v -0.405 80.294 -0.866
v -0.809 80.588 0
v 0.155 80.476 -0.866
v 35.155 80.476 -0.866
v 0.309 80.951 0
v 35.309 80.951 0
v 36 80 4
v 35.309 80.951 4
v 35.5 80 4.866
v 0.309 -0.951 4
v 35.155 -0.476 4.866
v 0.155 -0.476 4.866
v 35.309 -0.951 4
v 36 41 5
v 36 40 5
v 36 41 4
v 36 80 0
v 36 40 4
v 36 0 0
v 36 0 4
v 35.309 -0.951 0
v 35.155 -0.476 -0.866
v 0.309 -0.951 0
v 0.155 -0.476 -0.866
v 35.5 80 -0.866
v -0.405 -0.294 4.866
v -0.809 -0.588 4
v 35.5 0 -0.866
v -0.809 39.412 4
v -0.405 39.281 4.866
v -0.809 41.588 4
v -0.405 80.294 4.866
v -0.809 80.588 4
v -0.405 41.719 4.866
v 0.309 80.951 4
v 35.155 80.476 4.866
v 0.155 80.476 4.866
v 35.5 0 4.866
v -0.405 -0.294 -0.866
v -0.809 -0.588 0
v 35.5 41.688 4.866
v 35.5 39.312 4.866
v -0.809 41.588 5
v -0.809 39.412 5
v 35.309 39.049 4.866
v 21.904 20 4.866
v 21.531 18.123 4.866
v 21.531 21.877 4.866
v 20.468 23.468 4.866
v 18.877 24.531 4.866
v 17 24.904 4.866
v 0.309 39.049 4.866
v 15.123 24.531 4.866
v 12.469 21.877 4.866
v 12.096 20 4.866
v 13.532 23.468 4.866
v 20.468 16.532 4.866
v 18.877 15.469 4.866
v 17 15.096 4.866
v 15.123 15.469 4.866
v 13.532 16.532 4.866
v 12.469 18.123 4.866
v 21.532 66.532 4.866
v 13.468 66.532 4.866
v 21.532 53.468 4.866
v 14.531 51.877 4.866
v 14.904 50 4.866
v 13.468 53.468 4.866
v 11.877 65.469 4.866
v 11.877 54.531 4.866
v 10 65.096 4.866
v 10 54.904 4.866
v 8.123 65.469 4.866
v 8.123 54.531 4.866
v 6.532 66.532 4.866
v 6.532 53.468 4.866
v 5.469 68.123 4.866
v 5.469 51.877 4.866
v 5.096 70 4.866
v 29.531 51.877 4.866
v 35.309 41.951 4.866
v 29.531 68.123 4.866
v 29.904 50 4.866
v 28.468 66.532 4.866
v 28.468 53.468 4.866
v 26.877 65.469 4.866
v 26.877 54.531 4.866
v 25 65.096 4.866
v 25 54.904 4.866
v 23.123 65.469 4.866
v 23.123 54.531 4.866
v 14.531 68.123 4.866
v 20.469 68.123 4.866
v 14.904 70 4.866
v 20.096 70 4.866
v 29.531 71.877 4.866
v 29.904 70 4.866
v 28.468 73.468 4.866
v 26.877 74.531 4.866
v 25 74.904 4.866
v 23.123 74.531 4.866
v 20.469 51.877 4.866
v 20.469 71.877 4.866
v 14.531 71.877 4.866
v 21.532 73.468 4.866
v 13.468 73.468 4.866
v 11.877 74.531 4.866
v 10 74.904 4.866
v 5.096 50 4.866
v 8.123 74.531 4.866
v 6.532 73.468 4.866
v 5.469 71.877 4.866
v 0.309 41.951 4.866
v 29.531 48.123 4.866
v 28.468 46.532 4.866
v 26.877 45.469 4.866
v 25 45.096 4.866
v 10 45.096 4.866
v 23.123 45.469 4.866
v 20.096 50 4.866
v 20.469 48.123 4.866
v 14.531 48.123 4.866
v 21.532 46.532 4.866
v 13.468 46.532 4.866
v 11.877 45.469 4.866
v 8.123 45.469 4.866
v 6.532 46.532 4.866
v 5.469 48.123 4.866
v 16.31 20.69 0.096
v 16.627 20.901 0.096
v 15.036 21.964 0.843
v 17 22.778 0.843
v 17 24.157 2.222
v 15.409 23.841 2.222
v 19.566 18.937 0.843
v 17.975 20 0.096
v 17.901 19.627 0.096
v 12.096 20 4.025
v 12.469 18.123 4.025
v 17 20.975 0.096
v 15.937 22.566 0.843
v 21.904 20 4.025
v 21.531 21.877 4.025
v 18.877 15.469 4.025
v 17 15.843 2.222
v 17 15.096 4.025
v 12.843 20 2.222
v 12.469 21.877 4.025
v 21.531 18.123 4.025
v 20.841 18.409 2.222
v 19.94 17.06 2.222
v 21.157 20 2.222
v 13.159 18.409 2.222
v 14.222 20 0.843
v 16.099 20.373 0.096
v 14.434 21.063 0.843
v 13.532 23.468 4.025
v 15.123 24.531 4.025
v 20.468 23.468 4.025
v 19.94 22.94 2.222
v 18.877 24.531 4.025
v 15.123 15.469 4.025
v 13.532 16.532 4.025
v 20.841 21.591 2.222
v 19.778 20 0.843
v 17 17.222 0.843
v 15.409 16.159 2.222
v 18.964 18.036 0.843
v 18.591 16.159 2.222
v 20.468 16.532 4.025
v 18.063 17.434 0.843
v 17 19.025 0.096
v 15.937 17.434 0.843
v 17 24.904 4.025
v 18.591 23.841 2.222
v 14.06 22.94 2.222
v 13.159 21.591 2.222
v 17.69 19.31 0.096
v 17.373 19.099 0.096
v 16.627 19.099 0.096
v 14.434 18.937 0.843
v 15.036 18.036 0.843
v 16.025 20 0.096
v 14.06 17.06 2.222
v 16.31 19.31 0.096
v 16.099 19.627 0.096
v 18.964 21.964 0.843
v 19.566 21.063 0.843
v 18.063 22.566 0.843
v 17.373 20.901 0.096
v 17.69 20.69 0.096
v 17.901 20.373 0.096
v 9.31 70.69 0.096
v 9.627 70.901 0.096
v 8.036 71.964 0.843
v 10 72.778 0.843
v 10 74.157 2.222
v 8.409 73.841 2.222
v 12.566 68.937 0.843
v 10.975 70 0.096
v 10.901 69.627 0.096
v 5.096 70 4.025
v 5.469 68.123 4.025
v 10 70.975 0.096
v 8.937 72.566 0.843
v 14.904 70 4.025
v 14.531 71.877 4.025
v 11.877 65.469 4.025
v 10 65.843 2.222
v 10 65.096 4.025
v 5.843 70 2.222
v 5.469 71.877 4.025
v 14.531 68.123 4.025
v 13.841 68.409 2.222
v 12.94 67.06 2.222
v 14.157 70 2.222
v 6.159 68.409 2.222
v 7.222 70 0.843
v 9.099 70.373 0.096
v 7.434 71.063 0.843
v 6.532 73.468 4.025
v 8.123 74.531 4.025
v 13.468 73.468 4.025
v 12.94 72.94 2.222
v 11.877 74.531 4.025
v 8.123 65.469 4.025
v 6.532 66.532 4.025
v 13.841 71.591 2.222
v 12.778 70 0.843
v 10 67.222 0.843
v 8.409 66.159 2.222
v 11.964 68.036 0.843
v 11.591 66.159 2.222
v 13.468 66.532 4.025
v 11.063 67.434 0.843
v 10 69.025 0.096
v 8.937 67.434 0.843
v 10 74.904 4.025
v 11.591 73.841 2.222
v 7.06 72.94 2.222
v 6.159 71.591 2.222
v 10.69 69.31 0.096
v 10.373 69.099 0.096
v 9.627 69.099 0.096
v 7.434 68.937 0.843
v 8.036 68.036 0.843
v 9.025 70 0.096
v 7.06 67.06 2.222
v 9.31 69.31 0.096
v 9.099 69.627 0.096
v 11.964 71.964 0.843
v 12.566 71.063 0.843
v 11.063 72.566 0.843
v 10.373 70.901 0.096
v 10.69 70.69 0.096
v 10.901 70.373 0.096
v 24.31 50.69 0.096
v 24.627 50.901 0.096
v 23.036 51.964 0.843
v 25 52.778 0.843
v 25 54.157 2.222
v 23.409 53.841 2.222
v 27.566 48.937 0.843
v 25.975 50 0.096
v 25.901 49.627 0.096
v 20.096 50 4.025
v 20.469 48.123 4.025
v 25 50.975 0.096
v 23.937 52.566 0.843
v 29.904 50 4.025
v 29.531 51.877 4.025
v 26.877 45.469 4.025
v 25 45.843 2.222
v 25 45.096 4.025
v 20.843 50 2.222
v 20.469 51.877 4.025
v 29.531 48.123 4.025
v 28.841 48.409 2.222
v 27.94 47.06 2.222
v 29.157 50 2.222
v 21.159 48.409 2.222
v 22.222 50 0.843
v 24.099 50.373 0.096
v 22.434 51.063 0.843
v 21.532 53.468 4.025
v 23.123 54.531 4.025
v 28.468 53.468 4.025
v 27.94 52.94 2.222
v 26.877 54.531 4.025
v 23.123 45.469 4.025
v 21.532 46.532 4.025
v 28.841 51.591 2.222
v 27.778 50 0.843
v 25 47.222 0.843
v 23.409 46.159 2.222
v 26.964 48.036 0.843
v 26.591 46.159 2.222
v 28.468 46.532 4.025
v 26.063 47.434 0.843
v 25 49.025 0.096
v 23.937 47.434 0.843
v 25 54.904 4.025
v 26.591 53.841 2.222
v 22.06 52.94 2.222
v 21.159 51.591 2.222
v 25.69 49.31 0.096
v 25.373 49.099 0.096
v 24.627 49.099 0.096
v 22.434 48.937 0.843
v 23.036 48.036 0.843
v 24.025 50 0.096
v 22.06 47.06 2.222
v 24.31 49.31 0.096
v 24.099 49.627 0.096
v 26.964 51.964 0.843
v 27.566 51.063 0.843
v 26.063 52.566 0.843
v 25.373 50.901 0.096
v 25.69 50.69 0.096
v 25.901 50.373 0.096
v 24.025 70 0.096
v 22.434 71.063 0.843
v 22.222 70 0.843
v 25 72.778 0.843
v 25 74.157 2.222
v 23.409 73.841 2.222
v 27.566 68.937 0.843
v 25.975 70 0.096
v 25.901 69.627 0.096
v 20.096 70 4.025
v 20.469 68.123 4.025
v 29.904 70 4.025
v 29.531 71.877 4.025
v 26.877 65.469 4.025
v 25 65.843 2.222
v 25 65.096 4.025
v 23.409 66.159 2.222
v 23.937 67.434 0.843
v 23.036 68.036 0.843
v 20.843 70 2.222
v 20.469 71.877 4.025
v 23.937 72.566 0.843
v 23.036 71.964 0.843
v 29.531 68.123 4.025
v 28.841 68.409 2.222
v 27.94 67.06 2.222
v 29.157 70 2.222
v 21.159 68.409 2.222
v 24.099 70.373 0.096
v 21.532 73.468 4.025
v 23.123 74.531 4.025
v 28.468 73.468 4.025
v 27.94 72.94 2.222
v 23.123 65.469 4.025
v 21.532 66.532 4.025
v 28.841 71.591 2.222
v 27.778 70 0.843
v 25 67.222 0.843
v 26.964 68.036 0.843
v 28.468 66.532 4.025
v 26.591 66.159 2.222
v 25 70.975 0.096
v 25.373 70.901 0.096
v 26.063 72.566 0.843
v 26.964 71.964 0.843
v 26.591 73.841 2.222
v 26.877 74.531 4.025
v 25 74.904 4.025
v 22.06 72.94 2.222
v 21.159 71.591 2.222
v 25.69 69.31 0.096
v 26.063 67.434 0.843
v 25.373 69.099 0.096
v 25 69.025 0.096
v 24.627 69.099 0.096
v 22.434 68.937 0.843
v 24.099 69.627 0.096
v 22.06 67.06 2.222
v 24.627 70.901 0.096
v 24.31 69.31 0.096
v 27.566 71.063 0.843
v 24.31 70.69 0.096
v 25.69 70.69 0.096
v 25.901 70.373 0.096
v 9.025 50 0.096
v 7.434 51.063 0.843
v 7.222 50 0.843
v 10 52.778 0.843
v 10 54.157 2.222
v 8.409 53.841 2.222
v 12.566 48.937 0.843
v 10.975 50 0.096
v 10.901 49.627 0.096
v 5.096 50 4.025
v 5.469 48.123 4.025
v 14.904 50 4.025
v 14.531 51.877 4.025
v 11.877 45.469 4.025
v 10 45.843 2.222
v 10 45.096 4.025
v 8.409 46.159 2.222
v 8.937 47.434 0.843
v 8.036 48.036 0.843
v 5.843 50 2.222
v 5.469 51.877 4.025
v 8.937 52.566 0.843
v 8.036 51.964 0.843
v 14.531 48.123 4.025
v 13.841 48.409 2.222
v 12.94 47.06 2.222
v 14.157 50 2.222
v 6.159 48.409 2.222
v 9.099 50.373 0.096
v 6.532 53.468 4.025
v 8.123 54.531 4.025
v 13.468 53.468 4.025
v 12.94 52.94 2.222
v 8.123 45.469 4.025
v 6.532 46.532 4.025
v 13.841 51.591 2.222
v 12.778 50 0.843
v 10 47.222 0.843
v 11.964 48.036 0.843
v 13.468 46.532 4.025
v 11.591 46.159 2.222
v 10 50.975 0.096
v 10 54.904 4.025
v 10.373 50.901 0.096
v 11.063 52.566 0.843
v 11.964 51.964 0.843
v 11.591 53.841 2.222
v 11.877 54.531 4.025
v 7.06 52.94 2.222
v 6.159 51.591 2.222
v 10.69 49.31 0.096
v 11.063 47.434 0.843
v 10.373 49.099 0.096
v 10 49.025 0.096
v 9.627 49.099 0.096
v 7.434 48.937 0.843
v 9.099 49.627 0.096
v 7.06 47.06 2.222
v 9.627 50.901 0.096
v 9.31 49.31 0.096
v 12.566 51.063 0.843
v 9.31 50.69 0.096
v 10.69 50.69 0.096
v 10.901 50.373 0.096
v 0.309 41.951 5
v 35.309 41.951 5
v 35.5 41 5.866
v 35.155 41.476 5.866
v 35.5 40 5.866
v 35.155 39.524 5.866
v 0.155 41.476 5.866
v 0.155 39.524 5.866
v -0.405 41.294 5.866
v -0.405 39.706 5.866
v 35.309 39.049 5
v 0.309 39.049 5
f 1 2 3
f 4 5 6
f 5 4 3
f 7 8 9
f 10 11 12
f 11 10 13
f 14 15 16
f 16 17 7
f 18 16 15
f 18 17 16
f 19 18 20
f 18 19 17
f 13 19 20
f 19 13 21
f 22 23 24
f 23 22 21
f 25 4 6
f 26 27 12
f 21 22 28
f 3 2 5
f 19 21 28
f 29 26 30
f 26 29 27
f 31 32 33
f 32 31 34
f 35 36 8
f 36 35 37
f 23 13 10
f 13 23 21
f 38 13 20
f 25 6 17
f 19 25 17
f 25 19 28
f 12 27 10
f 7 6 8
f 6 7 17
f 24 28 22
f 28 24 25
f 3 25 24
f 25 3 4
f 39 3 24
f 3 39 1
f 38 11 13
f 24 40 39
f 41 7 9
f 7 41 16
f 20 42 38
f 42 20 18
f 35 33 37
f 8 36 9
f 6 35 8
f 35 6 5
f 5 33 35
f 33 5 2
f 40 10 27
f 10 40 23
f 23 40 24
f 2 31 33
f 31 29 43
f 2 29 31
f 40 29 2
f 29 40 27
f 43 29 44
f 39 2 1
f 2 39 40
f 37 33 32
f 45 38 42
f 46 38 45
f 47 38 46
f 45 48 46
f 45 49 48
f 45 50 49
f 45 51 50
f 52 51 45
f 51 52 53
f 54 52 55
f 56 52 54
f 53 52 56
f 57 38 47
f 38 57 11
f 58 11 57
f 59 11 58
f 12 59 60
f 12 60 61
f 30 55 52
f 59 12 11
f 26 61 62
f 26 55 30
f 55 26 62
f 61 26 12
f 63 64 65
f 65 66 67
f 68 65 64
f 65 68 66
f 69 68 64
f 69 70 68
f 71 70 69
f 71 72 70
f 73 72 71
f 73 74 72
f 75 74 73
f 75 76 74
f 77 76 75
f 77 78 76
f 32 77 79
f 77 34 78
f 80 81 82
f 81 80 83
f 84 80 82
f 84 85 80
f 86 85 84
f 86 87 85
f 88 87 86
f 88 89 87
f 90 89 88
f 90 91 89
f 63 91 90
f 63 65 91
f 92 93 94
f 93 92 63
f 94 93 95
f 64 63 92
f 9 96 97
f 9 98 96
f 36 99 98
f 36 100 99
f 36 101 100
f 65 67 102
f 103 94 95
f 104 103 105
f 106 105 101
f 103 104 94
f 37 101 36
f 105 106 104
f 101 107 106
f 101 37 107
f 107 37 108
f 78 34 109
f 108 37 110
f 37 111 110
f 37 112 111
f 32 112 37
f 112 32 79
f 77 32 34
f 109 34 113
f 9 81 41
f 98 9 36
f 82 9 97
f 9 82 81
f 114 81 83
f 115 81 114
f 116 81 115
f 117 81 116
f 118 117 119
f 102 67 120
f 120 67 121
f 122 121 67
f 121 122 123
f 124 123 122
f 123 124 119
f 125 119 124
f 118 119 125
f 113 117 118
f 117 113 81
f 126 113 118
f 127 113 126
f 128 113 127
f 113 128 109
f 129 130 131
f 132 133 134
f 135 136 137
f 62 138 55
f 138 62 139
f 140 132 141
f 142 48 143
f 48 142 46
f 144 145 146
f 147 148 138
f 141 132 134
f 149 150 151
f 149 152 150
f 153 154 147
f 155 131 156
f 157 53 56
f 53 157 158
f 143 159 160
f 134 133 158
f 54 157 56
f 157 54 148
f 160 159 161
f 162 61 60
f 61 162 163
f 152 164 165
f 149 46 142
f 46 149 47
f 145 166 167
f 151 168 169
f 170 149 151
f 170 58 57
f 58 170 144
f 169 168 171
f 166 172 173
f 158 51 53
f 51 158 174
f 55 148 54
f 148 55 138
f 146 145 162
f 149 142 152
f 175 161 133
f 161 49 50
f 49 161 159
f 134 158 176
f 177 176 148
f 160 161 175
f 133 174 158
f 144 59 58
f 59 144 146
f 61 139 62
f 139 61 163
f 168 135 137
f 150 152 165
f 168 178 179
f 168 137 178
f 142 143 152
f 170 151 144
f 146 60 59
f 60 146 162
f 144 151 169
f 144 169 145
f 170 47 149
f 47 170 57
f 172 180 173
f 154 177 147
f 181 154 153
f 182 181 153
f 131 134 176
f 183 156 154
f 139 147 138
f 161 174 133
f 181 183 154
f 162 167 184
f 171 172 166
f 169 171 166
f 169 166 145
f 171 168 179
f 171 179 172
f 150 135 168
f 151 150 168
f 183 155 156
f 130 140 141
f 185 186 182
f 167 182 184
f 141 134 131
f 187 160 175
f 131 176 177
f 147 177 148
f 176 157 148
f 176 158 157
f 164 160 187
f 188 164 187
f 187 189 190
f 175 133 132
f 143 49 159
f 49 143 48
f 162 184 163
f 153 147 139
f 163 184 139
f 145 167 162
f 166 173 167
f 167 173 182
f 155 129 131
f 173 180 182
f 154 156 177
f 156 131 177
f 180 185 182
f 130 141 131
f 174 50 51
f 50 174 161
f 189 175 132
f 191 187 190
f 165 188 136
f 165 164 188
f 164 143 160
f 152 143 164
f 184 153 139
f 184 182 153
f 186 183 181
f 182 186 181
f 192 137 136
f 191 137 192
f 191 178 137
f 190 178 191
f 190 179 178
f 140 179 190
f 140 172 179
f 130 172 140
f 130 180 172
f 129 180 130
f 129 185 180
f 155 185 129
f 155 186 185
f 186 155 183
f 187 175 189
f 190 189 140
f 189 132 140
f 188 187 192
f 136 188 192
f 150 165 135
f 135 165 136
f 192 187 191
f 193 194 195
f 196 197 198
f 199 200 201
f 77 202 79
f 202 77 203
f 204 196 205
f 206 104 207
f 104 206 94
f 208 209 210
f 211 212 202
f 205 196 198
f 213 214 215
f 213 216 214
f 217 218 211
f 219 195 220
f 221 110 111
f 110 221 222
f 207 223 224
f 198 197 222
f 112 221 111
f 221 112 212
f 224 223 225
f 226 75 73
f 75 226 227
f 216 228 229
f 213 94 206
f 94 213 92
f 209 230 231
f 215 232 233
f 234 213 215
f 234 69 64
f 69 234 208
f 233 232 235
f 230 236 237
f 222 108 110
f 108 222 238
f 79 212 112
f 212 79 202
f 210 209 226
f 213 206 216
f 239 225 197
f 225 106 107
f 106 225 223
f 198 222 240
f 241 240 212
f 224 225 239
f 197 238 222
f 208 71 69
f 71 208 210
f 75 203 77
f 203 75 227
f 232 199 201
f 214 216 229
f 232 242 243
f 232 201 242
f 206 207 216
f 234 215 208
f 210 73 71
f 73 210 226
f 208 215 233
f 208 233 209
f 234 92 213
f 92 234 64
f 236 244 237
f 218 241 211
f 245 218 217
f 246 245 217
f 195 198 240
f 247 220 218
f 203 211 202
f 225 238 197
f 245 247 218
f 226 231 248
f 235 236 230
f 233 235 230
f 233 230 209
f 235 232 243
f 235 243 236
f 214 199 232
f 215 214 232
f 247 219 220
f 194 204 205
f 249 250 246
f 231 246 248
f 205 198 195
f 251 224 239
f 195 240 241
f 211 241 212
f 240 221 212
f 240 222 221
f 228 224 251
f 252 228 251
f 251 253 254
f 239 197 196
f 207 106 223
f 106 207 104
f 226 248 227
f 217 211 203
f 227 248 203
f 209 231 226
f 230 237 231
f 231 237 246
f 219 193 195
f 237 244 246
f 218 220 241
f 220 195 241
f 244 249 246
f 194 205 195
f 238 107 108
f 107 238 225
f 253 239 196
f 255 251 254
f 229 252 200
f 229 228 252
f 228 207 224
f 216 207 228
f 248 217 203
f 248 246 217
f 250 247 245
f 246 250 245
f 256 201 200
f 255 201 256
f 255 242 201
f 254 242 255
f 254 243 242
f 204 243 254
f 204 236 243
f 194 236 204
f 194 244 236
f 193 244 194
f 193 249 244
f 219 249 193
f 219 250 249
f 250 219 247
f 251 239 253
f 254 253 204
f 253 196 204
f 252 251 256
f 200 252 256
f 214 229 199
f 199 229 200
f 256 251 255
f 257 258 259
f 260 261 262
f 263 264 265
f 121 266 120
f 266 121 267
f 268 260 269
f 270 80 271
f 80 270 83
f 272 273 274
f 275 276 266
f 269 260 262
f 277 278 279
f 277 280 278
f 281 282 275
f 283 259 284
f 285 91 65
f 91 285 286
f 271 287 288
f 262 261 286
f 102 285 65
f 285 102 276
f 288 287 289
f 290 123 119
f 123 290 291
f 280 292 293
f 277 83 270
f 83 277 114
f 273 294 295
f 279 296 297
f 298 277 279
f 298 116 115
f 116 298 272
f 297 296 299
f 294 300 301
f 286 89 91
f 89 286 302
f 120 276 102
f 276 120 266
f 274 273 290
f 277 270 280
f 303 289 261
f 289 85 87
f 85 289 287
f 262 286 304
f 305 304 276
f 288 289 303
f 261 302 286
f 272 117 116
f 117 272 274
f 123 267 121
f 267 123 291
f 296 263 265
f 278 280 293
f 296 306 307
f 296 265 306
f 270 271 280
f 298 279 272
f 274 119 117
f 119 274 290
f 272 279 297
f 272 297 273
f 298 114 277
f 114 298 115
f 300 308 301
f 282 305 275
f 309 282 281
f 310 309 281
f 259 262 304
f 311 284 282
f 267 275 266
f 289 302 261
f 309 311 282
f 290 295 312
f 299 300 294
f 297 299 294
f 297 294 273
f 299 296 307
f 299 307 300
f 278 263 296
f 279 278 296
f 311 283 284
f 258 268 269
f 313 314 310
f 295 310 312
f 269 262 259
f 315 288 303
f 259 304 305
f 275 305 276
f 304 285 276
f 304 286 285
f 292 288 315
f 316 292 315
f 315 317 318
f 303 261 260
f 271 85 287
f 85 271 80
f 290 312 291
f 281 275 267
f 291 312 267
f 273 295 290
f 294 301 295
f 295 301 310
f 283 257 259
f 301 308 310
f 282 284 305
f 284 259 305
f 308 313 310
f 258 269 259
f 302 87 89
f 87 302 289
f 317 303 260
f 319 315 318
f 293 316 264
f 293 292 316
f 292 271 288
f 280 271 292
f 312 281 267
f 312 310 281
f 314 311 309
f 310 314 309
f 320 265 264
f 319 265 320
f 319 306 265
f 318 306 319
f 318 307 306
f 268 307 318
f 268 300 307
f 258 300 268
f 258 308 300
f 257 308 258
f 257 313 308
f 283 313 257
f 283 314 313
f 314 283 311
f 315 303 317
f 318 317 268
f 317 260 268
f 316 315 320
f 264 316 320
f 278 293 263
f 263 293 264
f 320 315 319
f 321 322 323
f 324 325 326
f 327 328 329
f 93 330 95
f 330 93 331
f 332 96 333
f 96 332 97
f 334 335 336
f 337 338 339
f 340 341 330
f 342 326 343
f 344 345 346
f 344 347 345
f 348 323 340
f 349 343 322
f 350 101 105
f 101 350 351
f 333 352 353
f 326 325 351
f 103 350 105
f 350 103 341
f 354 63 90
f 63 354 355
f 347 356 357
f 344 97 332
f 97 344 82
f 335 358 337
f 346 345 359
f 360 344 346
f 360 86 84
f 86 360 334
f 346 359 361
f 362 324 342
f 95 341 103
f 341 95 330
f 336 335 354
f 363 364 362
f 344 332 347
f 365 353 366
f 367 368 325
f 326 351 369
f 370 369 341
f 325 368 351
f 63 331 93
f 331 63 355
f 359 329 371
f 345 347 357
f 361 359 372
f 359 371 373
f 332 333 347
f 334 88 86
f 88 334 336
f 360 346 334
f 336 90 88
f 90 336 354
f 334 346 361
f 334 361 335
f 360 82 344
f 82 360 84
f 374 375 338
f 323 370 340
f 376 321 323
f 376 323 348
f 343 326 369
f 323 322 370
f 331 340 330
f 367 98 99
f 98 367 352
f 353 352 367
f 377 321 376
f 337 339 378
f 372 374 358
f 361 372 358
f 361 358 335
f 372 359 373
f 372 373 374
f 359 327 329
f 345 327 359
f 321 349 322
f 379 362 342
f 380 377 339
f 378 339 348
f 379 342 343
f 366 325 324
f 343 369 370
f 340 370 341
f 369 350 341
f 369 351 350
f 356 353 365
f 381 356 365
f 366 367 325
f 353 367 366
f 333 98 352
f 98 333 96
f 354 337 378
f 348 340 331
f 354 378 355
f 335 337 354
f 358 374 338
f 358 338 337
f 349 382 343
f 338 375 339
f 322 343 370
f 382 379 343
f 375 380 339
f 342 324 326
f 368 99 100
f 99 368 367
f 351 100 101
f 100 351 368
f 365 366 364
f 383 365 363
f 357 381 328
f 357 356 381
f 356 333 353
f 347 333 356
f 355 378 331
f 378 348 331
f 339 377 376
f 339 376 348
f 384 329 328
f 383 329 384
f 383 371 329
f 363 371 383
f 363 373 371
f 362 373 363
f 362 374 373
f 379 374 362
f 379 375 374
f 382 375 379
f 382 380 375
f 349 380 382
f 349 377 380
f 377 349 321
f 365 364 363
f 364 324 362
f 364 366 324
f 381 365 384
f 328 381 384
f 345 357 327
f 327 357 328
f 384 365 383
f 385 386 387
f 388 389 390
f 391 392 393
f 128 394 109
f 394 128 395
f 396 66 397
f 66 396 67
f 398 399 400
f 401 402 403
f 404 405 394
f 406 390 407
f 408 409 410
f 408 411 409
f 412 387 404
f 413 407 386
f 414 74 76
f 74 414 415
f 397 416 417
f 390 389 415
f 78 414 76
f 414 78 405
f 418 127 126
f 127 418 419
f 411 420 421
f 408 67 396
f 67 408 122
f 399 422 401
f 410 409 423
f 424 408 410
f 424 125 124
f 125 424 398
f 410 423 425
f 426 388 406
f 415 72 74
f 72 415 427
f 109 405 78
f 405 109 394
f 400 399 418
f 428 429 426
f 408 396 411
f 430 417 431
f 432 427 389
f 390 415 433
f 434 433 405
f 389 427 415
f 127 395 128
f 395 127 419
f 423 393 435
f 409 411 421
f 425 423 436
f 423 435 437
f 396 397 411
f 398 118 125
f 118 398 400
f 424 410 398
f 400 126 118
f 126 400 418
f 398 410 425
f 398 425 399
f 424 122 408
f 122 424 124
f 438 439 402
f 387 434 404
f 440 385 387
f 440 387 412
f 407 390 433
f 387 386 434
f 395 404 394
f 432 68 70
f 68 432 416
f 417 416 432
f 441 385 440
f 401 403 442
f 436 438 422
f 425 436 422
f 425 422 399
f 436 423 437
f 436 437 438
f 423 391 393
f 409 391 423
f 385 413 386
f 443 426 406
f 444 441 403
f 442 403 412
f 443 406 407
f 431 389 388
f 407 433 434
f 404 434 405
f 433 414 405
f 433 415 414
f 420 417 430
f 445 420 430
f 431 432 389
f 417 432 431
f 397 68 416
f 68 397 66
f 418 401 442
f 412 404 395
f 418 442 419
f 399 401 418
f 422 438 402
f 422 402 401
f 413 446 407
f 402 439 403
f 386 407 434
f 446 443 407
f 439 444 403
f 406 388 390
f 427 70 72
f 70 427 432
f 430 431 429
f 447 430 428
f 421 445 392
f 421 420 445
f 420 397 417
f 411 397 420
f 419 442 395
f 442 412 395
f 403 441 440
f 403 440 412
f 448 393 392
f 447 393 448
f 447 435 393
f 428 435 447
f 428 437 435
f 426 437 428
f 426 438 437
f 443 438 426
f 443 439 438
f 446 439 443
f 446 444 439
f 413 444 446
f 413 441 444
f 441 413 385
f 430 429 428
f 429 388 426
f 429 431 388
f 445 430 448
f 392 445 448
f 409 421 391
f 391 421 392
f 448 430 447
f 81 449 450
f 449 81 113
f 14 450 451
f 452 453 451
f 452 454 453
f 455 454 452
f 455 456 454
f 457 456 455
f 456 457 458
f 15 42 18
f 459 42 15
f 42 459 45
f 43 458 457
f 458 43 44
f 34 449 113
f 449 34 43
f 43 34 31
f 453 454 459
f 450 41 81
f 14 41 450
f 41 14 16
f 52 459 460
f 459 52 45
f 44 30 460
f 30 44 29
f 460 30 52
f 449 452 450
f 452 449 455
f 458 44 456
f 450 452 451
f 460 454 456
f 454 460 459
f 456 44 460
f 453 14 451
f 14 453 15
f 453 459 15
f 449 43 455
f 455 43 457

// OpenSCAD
// Loguncov Maxim 13.12.13

//$fn=128;


translate([0,40,0])
minkowski()
{cube([35,1,5]);
sphere(1);
}

difference() {

//основа
minkowski()
{cube([35,80,4]);
sphere(1);
}

//отверстия
translate([17,20,5])sphere(5);

translate([10,70,5])sphere(5);
translate([25,50,5])sphere(5);
translate([25,70,5])sphere(5);
translate([10,50,5])sphere(5);



}
